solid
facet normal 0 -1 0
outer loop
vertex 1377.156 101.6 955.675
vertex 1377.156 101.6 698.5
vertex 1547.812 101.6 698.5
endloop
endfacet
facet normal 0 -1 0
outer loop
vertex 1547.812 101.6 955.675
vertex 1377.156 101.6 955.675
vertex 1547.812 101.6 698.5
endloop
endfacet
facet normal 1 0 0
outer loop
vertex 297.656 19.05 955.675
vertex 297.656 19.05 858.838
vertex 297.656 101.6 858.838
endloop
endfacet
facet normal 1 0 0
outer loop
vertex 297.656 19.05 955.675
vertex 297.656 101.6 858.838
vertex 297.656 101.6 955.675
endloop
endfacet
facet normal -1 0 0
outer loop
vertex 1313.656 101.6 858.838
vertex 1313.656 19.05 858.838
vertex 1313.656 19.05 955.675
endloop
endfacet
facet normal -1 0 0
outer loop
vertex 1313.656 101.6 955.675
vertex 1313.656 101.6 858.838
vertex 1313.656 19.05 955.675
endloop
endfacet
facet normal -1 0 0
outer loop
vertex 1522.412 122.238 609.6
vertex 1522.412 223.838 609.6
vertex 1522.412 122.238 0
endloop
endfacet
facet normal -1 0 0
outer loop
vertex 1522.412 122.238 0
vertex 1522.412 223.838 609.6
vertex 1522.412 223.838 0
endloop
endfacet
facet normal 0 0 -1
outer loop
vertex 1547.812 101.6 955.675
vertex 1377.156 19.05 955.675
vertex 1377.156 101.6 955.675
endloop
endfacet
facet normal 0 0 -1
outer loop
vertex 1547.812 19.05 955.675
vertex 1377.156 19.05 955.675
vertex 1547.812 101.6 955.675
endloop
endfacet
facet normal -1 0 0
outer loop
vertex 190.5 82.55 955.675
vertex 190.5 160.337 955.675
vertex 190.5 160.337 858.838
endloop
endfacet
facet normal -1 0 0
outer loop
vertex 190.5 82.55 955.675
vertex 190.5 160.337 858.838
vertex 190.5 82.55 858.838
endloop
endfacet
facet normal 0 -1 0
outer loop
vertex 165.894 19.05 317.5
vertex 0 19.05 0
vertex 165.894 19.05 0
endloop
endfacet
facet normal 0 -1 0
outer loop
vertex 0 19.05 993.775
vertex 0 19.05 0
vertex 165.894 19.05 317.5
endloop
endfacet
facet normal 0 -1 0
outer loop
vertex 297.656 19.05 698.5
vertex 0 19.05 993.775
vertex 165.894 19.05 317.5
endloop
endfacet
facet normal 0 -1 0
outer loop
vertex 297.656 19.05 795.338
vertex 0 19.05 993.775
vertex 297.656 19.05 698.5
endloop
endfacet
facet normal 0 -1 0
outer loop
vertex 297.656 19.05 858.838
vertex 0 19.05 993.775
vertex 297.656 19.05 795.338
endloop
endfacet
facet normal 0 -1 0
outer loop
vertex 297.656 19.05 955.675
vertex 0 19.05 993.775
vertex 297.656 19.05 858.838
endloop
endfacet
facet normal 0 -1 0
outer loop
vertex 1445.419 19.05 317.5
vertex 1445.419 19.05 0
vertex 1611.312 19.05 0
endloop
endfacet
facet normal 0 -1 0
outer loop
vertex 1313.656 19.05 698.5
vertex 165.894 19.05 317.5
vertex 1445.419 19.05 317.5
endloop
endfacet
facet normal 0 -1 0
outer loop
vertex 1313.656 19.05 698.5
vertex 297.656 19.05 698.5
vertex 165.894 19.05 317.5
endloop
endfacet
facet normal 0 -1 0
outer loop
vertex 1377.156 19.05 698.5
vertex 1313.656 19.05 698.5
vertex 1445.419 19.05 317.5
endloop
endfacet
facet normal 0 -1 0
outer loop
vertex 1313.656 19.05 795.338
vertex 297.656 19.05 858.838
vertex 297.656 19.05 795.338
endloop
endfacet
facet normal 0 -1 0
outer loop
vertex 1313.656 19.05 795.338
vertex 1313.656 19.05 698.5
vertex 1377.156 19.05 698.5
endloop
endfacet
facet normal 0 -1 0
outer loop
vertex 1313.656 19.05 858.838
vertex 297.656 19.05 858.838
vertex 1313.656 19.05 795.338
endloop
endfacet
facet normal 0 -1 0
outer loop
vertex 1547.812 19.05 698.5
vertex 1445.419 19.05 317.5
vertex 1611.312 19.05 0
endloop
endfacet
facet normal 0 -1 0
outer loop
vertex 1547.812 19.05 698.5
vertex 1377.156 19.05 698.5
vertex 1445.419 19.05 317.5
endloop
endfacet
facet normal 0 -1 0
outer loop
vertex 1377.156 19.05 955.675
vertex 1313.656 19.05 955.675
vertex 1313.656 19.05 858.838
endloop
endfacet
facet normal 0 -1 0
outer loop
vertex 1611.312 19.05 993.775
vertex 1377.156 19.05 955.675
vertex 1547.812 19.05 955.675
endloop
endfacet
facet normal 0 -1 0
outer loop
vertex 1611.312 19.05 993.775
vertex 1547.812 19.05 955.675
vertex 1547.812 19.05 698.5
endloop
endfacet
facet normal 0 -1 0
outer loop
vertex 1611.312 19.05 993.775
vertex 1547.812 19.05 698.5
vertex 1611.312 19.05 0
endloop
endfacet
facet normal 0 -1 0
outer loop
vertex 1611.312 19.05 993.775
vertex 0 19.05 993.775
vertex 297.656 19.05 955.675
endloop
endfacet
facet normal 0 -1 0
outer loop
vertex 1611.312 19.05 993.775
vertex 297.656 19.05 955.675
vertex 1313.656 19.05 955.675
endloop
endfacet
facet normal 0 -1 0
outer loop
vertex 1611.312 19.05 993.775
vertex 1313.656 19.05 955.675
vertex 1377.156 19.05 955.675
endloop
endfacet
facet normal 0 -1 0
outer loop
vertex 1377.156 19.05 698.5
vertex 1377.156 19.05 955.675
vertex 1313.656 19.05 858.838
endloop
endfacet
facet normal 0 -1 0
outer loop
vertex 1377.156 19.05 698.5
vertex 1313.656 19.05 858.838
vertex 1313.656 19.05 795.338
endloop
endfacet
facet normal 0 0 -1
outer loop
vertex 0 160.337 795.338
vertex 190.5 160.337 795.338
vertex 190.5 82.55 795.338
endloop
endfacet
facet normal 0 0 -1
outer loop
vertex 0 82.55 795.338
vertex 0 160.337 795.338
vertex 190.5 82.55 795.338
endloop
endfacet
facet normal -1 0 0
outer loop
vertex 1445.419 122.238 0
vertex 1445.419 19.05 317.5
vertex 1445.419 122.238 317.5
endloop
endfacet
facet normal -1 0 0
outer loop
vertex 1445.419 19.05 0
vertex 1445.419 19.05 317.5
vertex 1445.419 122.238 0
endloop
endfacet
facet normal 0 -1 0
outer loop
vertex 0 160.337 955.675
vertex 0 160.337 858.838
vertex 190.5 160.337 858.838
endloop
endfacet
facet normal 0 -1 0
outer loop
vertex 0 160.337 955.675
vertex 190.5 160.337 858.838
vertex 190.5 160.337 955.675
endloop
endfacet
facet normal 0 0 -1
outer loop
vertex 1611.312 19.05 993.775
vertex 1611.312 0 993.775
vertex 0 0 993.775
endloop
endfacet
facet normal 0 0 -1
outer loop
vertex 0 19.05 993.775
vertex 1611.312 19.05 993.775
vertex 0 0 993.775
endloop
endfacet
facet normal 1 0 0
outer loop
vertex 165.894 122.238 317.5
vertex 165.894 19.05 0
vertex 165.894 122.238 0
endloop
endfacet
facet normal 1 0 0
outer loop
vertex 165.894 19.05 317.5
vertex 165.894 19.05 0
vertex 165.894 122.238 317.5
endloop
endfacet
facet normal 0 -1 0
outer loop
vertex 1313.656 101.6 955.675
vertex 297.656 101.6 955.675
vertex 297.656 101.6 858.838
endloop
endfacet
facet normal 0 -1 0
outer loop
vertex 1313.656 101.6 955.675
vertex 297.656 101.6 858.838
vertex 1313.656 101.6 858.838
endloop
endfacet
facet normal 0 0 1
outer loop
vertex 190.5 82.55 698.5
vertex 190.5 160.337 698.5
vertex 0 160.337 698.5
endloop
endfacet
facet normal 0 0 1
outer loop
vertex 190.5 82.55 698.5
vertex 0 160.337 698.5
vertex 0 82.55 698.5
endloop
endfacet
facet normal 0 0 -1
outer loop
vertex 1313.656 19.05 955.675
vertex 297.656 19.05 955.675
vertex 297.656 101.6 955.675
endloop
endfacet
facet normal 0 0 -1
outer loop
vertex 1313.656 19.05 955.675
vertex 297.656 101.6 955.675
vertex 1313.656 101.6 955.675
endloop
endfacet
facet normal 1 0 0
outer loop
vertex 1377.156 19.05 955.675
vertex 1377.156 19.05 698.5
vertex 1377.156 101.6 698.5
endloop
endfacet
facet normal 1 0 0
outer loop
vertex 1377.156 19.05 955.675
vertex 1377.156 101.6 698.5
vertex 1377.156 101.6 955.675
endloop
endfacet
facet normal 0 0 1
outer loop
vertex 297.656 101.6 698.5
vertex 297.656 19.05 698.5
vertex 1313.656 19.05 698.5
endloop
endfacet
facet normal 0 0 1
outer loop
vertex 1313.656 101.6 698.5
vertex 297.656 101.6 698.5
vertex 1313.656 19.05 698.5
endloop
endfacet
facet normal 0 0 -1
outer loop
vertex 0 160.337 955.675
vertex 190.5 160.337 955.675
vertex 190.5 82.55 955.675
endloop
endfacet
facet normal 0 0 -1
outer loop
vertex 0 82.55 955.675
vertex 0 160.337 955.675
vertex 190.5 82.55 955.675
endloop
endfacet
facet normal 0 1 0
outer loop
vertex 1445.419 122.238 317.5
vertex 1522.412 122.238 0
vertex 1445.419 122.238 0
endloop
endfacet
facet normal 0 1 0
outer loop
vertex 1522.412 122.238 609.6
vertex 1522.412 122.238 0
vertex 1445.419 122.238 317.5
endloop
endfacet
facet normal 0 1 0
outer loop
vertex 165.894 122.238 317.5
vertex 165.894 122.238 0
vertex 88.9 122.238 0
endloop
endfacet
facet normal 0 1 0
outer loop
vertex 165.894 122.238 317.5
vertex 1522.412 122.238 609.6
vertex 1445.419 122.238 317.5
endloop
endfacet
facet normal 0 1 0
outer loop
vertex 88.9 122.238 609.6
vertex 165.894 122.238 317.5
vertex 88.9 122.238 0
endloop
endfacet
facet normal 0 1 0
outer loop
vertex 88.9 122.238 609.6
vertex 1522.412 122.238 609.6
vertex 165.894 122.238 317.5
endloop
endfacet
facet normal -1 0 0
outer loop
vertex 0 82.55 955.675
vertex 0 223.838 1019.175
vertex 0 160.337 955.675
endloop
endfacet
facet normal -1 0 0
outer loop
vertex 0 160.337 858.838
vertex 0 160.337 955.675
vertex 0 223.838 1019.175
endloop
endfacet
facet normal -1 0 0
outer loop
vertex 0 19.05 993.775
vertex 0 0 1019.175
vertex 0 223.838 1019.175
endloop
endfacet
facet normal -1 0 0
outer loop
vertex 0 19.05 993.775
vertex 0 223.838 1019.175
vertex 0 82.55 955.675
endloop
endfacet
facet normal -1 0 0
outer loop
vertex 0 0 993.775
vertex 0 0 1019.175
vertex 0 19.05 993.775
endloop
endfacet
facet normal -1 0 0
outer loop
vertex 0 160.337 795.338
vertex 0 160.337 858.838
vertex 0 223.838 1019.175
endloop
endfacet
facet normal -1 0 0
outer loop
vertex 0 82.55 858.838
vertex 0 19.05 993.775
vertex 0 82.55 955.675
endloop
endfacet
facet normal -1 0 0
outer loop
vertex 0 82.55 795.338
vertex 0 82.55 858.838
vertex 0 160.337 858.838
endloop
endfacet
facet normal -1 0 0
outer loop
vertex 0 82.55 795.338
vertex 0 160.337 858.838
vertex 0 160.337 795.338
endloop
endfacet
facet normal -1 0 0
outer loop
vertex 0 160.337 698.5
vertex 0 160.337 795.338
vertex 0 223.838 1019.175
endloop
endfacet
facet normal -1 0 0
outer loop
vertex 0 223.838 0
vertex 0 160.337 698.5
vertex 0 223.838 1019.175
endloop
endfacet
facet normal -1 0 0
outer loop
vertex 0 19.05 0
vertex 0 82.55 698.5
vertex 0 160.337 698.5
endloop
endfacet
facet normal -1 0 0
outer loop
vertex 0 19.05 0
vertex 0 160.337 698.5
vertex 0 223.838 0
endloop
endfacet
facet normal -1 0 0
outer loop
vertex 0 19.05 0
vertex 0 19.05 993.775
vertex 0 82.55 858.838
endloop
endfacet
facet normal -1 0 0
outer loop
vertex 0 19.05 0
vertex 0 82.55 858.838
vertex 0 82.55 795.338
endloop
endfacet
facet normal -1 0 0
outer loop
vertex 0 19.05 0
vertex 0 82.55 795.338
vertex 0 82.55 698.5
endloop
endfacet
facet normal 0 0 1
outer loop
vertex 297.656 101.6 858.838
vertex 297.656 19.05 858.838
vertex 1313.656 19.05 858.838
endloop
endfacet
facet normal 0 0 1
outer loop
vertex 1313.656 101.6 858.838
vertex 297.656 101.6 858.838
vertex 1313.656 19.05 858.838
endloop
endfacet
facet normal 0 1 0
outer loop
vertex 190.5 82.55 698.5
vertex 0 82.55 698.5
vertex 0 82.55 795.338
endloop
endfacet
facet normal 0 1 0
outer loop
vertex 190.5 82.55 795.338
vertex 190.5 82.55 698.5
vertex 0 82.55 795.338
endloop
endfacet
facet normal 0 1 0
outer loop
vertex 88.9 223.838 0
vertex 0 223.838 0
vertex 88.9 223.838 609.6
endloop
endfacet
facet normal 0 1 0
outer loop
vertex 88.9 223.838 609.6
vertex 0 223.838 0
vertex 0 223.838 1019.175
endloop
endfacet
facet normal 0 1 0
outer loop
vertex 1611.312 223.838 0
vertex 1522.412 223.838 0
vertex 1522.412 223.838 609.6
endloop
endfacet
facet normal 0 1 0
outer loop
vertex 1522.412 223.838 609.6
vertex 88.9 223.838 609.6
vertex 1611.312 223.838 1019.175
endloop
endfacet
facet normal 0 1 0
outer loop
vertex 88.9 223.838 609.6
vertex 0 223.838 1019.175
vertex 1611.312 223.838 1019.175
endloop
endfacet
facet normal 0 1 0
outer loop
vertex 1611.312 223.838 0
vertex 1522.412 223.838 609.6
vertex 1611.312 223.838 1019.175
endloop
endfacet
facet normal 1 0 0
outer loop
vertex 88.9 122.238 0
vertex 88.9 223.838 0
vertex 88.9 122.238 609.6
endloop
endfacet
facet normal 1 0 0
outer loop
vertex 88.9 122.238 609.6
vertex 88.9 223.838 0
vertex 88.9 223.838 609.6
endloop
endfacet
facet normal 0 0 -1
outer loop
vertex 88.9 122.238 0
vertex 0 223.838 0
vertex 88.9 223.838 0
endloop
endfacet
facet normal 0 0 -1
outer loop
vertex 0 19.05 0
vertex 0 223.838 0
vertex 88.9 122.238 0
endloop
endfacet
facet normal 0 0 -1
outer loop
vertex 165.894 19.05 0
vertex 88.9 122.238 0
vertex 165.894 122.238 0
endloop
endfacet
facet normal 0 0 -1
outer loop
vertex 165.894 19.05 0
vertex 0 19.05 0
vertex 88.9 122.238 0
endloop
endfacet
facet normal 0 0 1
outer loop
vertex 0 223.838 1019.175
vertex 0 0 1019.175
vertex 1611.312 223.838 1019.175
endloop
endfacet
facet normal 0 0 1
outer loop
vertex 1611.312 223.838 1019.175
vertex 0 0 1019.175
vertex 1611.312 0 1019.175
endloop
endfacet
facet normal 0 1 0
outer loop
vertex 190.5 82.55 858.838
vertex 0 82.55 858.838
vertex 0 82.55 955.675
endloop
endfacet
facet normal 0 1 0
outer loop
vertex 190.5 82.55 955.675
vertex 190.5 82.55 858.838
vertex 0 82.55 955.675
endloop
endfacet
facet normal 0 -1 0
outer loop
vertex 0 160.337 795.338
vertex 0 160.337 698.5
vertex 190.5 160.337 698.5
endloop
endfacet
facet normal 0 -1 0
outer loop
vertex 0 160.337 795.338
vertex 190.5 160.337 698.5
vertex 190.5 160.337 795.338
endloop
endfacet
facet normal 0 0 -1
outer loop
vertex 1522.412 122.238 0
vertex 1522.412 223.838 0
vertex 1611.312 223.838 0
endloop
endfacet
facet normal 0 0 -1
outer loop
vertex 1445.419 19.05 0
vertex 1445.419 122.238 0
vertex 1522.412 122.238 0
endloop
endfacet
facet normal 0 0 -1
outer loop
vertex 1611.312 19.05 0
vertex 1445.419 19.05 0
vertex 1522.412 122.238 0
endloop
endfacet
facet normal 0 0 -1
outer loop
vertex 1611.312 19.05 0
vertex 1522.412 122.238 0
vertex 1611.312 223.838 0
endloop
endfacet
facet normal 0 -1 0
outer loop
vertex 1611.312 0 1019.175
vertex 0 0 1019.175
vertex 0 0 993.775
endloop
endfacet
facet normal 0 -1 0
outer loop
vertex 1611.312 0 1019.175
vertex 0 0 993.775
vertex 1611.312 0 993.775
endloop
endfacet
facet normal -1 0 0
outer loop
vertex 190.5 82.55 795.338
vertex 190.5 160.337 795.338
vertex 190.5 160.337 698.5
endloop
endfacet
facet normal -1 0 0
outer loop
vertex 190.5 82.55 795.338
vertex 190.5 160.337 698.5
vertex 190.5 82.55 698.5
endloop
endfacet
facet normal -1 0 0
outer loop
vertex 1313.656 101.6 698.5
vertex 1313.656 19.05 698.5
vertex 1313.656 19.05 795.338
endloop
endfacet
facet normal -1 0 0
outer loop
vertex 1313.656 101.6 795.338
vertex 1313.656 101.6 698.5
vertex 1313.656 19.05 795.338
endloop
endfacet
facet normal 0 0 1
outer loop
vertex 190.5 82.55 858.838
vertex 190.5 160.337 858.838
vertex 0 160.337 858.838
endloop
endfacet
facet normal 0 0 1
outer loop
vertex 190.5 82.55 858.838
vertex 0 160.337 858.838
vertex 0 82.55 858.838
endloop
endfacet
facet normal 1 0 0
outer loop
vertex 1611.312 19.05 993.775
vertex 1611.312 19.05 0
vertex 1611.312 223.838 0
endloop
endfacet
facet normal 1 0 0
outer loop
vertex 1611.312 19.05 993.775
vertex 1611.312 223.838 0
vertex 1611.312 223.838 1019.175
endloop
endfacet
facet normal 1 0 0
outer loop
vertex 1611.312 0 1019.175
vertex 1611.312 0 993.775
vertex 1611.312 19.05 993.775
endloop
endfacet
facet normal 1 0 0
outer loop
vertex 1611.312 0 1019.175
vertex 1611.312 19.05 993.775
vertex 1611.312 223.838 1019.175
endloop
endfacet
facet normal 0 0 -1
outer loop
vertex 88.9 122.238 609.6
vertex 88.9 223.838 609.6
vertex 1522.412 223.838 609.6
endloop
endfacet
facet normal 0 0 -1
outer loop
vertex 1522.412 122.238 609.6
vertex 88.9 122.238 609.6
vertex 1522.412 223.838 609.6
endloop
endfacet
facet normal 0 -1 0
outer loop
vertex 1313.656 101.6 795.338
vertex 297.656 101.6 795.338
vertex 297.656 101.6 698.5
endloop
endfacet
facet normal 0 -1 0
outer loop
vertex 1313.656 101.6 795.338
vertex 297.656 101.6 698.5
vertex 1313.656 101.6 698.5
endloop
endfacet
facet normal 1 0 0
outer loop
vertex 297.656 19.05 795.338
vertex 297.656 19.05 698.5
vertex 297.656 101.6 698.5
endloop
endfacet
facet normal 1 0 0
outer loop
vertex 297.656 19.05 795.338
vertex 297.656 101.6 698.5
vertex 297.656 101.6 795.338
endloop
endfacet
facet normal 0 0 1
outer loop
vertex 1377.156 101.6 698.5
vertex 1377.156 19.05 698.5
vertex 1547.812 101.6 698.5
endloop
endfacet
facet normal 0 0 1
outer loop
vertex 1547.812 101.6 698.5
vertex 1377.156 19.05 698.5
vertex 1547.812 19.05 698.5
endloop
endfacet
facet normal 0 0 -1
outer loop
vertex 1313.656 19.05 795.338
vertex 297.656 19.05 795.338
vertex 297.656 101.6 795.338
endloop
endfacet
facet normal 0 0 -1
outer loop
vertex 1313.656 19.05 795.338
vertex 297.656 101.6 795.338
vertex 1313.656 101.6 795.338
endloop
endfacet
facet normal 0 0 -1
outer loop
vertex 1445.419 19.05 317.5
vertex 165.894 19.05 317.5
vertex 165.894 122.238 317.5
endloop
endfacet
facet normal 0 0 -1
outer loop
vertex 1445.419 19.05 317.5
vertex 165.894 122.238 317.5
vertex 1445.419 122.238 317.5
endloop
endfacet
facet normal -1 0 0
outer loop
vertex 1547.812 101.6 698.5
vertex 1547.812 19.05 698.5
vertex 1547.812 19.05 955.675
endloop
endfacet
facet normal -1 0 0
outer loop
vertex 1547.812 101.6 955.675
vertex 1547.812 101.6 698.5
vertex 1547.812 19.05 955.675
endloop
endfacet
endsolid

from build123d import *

# Parameters (mm, degrees)
F0_W     = 1016
F0_H     = 96.8375
F0_W_2   = 1611.3125
F0_H_2   = 25.4
F0_W_3   = 170.65625
F0_H_3   = 257.175
F1_DEPTH = 223.8375
F2_DEPTH = 101.6
F3_DEPTH = 19.05
F4_W     = 77.7875
F4_H     = 96.8375
F5_DEPTH = 190.5
F7_DEPTH = 101.6


with BuildPart() as f1:
    # F0 (on Front) → F1 (new body)
    with BuildSketch(Plane.XZ):
        Polygon((0, 698.5), (0, 0), (165.89375, 0), (165.89375, 317.5), (1445.41875, 317.5), (1445.41875, 0), (1611.3125, 0), (1611.3125, 698.5), (1547.8125, 698.5), (1377.15625, 698.5), (1313.65625, 698.5), (297.65625, 698.5), align=None)
        Polygon((0, 993.775), (0, 698.5), (297.65625, 698.5), (297.65625, 795.3375), (1313.65625, 795.3375), (1313.65625, 698.5), (1377.15625, 698.5), (1377.15625, 955.675), (1547.8125, 955.675), (1547.8125, 698.5), (1611.3125, 698.5), (1611.3125, 993.775), align=None)
        with Locations((805.65625, 907.25625)):
            Rectangle(F0_W, F0_H, mode=Mode.SUBTRACT)
        with Locations((805.65625, 746.91875)):
            Rectangle(F0_W, F0_H)
        with Locations((805.65625, 907.25625)):
            Rectangle(F0_W, F0_H)
        with Locations((805.65625, 1006.475)):
            Rectangle(F0_W_2, F0_H_2)
        with Locations((1462.484375, 827.0875)):
            Rectangle(F0_W_3, F0_H_3)
    extrude(amount=-F1_DEPTH)

    # F0 (on Front) → F2 (cut)
    with BuildSketch(Plane.XZ):
        with Locations((805.65625, 907.25625)):
            Rectangle(F0_W, F0_H)
        with Locations((805.65625, 746.91875)):
            Rectangle(F0_W, F0_H)
        with Locations((1462.484375, 827.0875)):
            Rectangle(F0_W_3, F0_H_3)
    extrude(amount=-F2_DEPTH, mode=Mode.SUBTRACT)

    # F0 (on Front) → F3 (cut)
    with BuildSketch(Plane.XZ):
        Polygon((0, 698.5), (0, 0), (165.89375, 0), (165.89375, 317.5), (1445.41875, 317.5), (1445.41875, 0), (1611.3125, 0), (1611.3125, 698.5), (1547.8125, 698.5), (1377.15625, 698.5), (1313.65625, 698.5), (297.65625, 698.5), align=None)
        Polygon((0, 993.775), (0, 698.5), (297.65625, 698.5), (297.65625, 795.3375), (1313.65625, 795.3375), (1313.65625, 698.5), (1377.15625, 698.5), (1377.15625, 955.675), (1547.8125, 955.675), (1547.8125, 698.5), (1611.3125, 698.5), (1611.3125, 993.775), align=None)
        with Locations((805.65625, 907.25625)):
            Rectangle(F0_W, F0_H, mode=Mode.SUBTRACT)
    extrude(amount=-F3_DEPTH, mode=Mode.SUBTRACT)

    # F4 (on face) → F5 (cut)
    with BuildSketch(Plane(origin=(0, 0, 0), x_dir=(0, -1, 0), z_dir=(-1, 0, 0))):
        with Locations((-121.44375, 907.25625)):
            Rectangle(F4_W, F4_H)
        with Locations((-121.44375, 746.91875)):
            Rectangle(F4_W, F4_H)
    extrude(amount=-F5_DEPTH, mode=Mode.SUBTRACT)

    # F6 (on face) → F7 (cut)
    with BuildSketch(Plane(origin=(0, 223.8375, 0), x_dir=(-1, 0, 0), z_dir=(0, 1, 0))):
        Polygon((-1522.4125, 609.6), (-1522.4125, 0), (-1445.41875, 0), (-1445.41875, 317.5), (-165.89375, 317.5), (-165.89375, 0), (-88.9, 0), (-88.9, 609.6), align=None)
    extrude(amount=-F7_DEPTH, mode=Mode.SUBTRACT)


solid = f1.part
